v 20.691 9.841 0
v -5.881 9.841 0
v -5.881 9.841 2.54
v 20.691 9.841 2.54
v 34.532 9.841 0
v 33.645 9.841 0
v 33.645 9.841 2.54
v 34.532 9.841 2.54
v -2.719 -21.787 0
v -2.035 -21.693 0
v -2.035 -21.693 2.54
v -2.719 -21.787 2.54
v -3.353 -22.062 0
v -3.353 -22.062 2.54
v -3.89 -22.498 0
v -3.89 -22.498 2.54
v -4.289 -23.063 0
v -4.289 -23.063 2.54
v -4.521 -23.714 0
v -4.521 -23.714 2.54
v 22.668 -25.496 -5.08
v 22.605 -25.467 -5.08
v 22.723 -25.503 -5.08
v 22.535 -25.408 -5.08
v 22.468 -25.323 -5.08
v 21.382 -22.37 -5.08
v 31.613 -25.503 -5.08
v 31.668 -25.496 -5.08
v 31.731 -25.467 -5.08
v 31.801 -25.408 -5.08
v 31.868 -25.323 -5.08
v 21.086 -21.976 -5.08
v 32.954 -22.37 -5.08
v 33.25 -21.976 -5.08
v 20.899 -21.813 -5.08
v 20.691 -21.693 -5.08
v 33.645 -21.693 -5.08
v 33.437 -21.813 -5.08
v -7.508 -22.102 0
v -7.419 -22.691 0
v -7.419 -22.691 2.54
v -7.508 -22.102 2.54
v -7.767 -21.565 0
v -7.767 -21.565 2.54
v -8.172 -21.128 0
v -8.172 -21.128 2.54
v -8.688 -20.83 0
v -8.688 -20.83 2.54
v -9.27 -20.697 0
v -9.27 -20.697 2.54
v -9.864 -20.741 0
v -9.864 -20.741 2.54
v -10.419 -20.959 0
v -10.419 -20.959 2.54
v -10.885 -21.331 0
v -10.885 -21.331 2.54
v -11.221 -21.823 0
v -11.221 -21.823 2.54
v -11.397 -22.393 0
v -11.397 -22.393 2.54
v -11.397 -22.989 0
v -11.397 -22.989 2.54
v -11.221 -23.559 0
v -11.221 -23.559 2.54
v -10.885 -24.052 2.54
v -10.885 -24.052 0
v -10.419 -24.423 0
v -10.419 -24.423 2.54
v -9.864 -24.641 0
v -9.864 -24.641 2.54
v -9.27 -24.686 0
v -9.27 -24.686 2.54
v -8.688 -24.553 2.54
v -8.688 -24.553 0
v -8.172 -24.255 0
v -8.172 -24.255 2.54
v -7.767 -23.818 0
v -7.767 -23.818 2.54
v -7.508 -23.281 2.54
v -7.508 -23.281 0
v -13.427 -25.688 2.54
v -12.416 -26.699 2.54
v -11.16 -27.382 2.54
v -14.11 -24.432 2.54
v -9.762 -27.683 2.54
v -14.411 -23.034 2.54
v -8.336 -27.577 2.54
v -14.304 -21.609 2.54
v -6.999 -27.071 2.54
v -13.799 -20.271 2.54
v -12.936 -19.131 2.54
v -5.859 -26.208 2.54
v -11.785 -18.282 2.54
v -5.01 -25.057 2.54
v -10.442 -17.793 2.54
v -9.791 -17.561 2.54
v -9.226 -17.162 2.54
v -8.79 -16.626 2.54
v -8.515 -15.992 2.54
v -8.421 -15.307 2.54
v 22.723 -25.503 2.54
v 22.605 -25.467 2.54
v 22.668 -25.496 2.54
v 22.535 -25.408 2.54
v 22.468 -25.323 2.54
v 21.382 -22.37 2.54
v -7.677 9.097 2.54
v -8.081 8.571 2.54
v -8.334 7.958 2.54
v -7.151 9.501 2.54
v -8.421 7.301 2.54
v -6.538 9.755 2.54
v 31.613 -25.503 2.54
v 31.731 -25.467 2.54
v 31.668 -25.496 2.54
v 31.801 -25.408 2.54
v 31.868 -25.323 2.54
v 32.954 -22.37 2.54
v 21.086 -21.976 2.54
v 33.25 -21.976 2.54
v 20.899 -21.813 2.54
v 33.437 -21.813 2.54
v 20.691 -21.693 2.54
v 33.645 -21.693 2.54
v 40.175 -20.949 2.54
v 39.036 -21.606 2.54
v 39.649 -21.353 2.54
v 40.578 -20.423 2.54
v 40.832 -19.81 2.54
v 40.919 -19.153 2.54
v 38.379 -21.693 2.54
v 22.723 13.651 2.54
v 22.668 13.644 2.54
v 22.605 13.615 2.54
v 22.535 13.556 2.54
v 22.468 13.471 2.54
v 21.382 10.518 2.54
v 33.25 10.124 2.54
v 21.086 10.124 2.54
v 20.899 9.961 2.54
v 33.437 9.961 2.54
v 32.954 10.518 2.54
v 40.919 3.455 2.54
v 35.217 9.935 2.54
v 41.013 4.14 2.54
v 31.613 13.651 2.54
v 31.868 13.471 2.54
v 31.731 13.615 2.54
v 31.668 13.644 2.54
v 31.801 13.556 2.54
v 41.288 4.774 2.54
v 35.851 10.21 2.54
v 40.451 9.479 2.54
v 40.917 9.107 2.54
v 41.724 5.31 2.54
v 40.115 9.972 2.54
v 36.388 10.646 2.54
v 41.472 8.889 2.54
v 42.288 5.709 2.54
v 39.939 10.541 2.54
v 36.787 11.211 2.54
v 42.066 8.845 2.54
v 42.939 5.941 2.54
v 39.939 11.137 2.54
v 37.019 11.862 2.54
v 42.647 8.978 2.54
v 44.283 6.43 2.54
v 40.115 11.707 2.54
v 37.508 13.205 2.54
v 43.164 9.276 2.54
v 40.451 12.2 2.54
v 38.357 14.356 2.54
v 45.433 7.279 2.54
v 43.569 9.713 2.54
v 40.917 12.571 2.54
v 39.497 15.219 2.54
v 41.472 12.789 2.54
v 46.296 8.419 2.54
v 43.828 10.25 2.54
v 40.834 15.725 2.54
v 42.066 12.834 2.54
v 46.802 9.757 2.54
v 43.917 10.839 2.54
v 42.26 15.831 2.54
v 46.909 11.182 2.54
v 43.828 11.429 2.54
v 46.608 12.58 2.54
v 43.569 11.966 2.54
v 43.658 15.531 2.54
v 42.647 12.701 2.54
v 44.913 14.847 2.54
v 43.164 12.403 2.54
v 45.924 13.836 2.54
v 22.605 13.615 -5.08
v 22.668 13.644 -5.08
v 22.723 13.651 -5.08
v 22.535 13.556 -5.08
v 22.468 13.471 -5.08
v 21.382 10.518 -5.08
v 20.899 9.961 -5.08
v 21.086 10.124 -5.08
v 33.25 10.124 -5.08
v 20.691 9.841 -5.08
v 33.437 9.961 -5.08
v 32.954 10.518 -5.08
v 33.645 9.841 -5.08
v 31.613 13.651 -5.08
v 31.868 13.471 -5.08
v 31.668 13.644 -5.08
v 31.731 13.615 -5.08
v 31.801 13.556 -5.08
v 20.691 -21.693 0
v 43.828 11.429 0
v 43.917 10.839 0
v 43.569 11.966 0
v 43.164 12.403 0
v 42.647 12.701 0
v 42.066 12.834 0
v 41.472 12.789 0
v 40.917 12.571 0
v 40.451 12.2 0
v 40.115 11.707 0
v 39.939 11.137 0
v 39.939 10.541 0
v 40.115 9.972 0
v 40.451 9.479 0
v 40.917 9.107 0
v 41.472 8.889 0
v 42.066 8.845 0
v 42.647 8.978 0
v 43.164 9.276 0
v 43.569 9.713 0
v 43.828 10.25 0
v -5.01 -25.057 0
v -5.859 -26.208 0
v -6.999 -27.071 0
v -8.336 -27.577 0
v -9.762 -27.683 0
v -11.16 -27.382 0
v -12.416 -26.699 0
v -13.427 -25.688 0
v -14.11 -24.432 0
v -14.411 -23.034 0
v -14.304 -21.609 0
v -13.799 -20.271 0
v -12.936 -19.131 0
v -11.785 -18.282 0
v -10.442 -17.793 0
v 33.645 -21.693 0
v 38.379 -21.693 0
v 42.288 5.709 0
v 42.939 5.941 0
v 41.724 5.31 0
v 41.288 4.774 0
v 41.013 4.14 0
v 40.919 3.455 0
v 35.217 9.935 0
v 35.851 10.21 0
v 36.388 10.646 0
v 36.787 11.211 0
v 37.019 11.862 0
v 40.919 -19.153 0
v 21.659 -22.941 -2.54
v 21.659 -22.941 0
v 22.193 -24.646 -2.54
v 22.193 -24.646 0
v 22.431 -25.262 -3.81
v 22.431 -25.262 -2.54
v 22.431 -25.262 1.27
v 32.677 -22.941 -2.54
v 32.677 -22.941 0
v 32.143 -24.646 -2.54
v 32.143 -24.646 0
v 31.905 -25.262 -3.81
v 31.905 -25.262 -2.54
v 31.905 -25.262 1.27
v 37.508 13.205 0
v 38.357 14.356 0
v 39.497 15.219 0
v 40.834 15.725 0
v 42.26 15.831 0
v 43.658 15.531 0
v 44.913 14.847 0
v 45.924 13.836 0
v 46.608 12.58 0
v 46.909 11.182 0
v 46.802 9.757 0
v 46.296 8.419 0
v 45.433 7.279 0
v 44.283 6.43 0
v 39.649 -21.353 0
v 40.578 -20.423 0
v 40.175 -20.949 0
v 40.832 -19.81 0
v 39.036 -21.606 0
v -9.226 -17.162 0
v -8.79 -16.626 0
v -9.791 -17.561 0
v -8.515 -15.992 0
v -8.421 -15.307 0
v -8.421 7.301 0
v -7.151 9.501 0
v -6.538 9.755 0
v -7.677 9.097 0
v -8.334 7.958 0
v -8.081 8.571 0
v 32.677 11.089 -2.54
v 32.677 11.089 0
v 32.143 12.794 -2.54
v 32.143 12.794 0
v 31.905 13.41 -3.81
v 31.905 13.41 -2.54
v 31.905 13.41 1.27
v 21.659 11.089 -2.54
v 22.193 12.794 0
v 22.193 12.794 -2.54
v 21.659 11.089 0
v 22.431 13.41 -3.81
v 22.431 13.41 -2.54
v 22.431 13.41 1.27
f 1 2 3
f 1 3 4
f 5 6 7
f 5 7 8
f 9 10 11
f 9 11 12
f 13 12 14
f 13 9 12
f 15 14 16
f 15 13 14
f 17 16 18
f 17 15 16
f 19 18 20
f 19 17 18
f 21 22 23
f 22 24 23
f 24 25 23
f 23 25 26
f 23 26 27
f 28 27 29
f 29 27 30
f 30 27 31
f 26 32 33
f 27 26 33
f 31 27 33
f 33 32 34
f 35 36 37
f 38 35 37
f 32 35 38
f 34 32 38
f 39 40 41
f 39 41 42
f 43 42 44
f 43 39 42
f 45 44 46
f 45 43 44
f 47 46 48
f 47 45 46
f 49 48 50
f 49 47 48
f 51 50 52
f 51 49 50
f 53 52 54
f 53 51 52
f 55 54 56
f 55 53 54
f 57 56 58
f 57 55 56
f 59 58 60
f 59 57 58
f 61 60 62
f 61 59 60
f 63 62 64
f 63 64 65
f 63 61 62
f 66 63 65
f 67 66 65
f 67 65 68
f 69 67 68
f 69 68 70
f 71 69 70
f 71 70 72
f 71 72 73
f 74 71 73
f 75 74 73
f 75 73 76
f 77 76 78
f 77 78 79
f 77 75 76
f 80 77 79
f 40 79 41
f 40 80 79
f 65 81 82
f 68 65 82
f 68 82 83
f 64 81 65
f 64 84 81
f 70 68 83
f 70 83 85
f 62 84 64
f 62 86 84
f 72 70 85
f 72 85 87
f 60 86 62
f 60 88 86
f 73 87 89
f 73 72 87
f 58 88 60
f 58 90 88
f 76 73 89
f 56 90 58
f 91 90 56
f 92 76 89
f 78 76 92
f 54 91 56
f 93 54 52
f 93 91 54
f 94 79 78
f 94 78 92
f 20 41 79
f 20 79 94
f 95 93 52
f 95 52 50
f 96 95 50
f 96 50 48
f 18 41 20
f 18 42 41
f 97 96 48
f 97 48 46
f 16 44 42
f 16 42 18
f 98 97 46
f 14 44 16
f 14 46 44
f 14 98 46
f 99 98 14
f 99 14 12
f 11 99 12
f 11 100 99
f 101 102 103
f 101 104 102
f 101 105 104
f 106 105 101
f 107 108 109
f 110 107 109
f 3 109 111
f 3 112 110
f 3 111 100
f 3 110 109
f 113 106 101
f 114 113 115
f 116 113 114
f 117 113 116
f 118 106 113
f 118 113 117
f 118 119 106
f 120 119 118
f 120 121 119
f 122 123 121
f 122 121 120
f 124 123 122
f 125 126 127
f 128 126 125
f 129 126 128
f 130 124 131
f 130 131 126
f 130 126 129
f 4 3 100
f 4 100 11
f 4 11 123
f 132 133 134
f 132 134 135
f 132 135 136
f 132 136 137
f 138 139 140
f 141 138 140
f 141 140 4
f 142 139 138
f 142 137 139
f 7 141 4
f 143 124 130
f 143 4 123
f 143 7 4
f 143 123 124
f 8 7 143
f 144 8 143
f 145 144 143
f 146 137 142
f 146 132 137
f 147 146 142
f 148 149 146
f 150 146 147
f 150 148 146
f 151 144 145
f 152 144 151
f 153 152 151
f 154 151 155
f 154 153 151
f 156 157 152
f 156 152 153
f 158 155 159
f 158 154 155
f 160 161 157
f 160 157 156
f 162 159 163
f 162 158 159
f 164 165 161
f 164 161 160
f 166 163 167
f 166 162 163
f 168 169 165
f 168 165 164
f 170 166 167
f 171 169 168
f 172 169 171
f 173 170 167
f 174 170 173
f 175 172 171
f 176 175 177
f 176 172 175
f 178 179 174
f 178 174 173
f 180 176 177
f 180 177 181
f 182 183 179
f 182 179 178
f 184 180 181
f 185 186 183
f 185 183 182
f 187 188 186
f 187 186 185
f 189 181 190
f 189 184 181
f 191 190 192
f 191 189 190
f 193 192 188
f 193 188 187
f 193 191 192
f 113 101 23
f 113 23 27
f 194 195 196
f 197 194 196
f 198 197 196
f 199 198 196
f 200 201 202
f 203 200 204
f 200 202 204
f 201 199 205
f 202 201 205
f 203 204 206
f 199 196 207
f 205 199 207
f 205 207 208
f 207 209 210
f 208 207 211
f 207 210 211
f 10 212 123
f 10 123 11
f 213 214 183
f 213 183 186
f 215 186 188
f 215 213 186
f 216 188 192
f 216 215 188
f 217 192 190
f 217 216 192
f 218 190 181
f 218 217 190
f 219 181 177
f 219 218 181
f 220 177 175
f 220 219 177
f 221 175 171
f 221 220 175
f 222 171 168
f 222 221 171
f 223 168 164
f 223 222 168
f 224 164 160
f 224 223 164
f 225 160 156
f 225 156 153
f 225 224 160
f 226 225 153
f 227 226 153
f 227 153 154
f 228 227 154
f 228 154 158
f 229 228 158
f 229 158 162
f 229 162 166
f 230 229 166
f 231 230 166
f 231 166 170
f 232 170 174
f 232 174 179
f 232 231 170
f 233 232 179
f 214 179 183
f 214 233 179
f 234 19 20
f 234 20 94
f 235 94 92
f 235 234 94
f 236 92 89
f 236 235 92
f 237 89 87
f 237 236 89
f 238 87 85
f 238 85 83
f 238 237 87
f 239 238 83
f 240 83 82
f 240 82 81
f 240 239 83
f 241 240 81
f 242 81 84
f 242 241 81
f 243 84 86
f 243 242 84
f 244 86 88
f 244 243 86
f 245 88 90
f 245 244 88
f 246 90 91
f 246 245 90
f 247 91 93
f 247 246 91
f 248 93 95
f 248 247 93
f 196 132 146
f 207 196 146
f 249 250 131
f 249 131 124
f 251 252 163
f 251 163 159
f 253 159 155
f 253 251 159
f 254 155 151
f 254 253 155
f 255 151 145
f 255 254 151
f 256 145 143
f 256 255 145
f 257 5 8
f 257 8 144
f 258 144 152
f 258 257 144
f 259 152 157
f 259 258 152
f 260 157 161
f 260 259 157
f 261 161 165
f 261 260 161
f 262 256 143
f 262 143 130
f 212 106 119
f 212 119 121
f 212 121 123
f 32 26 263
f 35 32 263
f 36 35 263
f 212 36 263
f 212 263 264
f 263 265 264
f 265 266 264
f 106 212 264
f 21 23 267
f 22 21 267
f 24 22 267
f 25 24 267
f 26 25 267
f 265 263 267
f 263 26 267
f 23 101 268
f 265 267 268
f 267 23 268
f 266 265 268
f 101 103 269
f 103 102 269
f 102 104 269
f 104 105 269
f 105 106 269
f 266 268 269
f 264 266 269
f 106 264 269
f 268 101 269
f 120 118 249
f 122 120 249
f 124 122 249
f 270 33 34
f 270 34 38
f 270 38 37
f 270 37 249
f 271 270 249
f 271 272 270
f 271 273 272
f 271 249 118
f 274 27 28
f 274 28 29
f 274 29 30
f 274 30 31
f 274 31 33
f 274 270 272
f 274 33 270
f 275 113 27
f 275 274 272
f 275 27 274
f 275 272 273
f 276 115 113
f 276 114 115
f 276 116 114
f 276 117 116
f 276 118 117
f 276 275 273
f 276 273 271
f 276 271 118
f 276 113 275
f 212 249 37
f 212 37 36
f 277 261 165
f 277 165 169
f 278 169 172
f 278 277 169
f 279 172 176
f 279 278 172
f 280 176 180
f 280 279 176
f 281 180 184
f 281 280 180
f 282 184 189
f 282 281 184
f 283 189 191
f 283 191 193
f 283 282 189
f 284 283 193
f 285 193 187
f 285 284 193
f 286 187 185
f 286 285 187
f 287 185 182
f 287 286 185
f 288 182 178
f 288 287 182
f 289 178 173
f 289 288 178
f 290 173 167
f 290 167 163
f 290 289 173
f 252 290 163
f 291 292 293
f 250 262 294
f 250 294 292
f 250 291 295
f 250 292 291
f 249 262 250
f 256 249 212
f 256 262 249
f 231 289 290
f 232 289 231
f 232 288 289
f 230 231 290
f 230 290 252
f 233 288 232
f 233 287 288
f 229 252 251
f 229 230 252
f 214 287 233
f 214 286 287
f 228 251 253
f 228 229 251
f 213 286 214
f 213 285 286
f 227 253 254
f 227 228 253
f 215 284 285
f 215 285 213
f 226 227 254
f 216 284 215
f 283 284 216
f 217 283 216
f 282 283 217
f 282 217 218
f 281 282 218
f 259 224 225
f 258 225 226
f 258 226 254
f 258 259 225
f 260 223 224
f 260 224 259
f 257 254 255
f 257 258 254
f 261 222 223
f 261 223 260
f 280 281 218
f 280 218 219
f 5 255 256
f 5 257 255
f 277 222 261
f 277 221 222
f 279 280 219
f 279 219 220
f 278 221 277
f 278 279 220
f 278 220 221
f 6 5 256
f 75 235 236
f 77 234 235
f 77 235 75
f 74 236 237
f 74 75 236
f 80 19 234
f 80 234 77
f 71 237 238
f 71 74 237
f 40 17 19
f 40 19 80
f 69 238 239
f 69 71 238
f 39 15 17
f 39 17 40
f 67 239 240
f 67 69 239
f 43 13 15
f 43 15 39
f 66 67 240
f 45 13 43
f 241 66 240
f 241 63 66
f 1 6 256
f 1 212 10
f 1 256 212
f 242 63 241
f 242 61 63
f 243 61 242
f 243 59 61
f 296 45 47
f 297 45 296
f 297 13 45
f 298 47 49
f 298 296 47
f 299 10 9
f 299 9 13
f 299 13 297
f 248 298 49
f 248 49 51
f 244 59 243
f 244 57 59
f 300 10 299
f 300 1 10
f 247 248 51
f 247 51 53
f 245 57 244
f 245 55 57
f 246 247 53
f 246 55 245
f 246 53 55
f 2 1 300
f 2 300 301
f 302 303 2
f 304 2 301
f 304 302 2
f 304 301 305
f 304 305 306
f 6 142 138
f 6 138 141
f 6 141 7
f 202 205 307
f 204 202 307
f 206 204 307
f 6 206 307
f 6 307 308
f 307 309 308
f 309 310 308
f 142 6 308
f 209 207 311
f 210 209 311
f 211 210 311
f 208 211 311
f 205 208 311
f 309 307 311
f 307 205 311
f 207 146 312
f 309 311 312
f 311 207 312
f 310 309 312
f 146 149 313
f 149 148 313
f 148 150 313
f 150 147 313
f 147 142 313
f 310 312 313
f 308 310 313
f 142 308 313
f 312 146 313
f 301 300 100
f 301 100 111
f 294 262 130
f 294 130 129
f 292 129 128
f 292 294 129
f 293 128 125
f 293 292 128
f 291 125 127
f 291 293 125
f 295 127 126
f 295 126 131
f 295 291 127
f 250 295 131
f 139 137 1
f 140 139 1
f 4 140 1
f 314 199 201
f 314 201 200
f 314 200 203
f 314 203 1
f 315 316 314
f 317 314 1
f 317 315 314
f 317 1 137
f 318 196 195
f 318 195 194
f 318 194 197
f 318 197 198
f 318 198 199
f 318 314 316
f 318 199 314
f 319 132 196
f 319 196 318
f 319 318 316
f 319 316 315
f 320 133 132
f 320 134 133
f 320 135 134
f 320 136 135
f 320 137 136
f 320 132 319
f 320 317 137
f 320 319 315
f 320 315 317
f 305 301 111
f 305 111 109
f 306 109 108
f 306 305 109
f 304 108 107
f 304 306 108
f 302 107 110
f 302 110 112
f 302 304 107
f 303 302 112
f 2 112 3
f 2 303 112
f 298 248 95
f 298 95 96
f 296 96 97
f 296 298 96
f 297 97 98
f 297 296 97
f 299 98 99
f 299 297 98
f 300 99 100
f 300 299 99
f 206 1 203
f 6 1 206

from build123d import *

# Parameters (mm, degrees)
SKETCH1_R           = 2
BOSS_EXTRUDE1_DEPTH = 2.54
SKETCH2_W           = 8.89
SKETCH2_H           = 3.81
BOSS_EXTRUDE2_DEPTH = 7.62


with BuildPart() as part:
    # Sketch1 → Boss-Extrude1 (new body)
    # profile 1 of 2: a face of its own
    with BuildSketch(Plane.XY):
        with BuildLine():
            ThreePointArc((42.939465347, 5.941095032), (41.487522441, 5.056745133), (40.918582885, 3.454708702))
            Line((40.918582885, 3.454708702), (40.918582885, 3.15450519))
            Line((40.918582885, 3.15450519), (40.918582885, -15.00649481))
            Line((40.918582885, -15.00649481), (40.918582885, -19.15304481))
            ThreePointArc((40.918582885, -19.15304481), (40.174634109, -20.949096034), (38.378582885, -21.69304481))
            Line((38.378582885, -21.69304481), (-2.034570627, -21.69304481))
            ThreePointArc((-2.034570627, -21.69304481), (-3.636607058, -22.261984366), (-4.520956957, -23.713927272))
            ThreePointArc((-4.520956957, -23.713927272), (-12.957358938, -26.229486634), (-10.441799577, -17.793084652))
            ThreePointArc((-10.441799577, -17.793084652), (-8.989856671, -16.908734753), (-8.420917115, -15.306698322))
            Line((-8.420917115, -15.306698322), (-8.420917115, -14.63819481))
            Line((-8.420917115, -14.63819481), (-8.420917115, 2.78620519))
            Line((-8.420917115, 2.78620519), (-8.420917115, 7.30105519))
            ThreePointArc((-8.420917115, 7.30105519), (-7.676968339, 9.097106414), (-5.880917115, 9.84105519))
            Line((-5.880917115, 9.84105519), (34.532236397, 9.84105519))
            ThreePointArc((34.532236397, 9.84105519), (36.134272828, 10.409994746), (37.018622727, 11.861937652))
            ThreePointArc((37.018622727, 11.861937652), (45.455024709, 14.377497013), (42.939465347, 5.941095032))
        make_face()
        with Locations((-9.419138026, -22.691265722)):
            Circle(SKETCH1_R, mode=Mode.SUBTRACT)
        with Locations((41.916803797, 10.839276102)):
            Circle(SKETCH1_R, mode=Mode.SUBTRACT)
        with BuildLine():
            ThreePointArc((38.378582885, 6.03105519), (38.006608497, 6.929080802), (37.108582885, 7.30105519))
            Line((37.108582885, 7.30105519), (-4.610917115, 7.30105519))
            ThreePointArc((-4.610917115, 7.30105519), (-5.508942727, 6.929080802), (-5.880917115, 6.03105519))
            Line((-5.880917115, 6.03105519), (-5.880917115, 2.78620519))
            Line((-5.880917115, 2.78620519), (-5.880917115, -14.63819481))
            Line((-5.880917115, -14.63819481), (-5.880917115, -17.88304481))
            ThreePointArc((-5.880917115, -17.88304481), (-5.508942727, -18.781070422), (-4.610917115, -19.15304481))
            Line((-4.610917115, -19.15304481), (37.108582885, -19.15304481))
            ThreePointArc((37.108582885, -19.15304481), (38.006608497, -18.781070422), (38.378582885, -17.88304481))
            Line((38.378582885, -17.88304481), (38.378582885, -15.00649481))
            Line((38.378582885, -15.00649481), (38.378582885, 3.15450519))
            Line((38.378582885, 3.15450519), (38.378582885, 6.03105519))
        make_face(mode=Mode.SUBTRACT)
    # profile 2 of 2: a face of its own
    with BuildSketch(Plane.XY):
        with BuildLine():
            Line((38.378582885, 6.03105519), (38.378582885, 3.15450519))
            Line((38.378582885, 3.15450519), (38.378582885, -15.00649481))
            Line((38.378582885, -15.00649481), (38.378582885, -17.88304481))
            ThreePointArc((38.378582885, -17.88304481), (38.006608497, -18.781070422), (37.108582885, -19.15304481))
            Line((37.108582885, -19.15304481), (-4.610917115, -19.15304481))
            ThreePointArc((-4.610917115, -19.15304481), (-5.508942727, -18.781070422), (-5.880917115, -17.88304481))
            Line((-5.880917115, -17.88304481), (-5.880917115, -14.63819481))
            Line((-5.880917115, -14.63819481), (-5.880917115, 2.78620519))
            Line((-5.880917115, 2.78620519), (-5.880917115, 6.03105519))
            ThreePointArc((-5.880917115, 6.03105519), (-5.508942727, 6.929080802), (-4.610917115, 7.30105519))
            Line((-4.610917115, 7.30105519), (37.108582885, 7.30105519))
            ThreePointArc((37.108582885, 7.30105519), (38.006608497, 6.929080802), (38.378582885, 6.03105519))
        make_face()
    extrude(amount=BOSS_EXTRUDE1_DEPTH)

    # Sketch2 → Boss-Extrude2 (add)
    with BuildSketch(Plane.XY.offset(2.54)):
        with BuildLine():
            Line((31.613029704, -21.69304481), (31.613029704, -25.50304481))
            add(Edge.make_bspline(
                [(31.613029704, -25.50304481), (32.285115867, -25.50304481), (32.316518426, -22.279360341), (33.645471093, -21.69304481)],
                knots=[0, 0, 0, 0, 1, 1, 1, 1], degree=3))
            Line((33.645471093, -21.69304481), (31.613029704, -21.69304481))
        make_face()
        with BuildLine():
            add(Edge.make_bspline(
                [(22.723029704, -25.50304481), (22.050943542, -25.50304481), (22.019540983, -22.279360341), (20.690588316, -21.69304481)],
                knots=[0, 0, 0, 0, 1, 1, 1, 1], degree=3))
            Line((22.723029704, -25.50304481), (22.723029704, -21.69304481))
            Line((22.723029704, -21.69304481), (20.690588316, -21.69304481))
        make_face()
        with Locations((27.168029704, -23.59804481)):
            Rectangle(SKETCH2_W, SKETCH2_H)
        with BuildLine():
            Line((20.690588316, 9.84105519), (22.723029704, 9.84105519))
            Line((22.723029704, 9.84105519), (22.723029704, 13.65105519))
            add(Edge.make_bspline(
                [(22.723029704, 13.65105519), (22.050943542, 13.65105519), (22.019540983, 10.427370721), (20.690588316, 9.84105519)],
                knots=[0, 0, 0, 0, 1, 1, 1, 1], degree=3))
        make_face()
        with Locations((27.168029704, 11.74605519)):
            Rectangle(SKETCH2_W, SKETCH2_H)
        with BuildLine():
            Line((31.613029704, 13.65105519), (31.613029704, 9.84105519))
            Line((31.613029704, 9.84105519), (33.645471093, 9.84105519))
            add(Edge.make_bspline(
                [(31.613029704, 13.65105519), (32.285115867, 13.65105519), (32.316518426, 10.427370721), (33.645471093, 9.84105519)],
                knots=[0, 0, 0, 0, 1, 1, 1, 1], degree=3))
        make_face()
    extrude(amount=-BOSS_EXTRUDE2_DEPTH)


solid = part.part
